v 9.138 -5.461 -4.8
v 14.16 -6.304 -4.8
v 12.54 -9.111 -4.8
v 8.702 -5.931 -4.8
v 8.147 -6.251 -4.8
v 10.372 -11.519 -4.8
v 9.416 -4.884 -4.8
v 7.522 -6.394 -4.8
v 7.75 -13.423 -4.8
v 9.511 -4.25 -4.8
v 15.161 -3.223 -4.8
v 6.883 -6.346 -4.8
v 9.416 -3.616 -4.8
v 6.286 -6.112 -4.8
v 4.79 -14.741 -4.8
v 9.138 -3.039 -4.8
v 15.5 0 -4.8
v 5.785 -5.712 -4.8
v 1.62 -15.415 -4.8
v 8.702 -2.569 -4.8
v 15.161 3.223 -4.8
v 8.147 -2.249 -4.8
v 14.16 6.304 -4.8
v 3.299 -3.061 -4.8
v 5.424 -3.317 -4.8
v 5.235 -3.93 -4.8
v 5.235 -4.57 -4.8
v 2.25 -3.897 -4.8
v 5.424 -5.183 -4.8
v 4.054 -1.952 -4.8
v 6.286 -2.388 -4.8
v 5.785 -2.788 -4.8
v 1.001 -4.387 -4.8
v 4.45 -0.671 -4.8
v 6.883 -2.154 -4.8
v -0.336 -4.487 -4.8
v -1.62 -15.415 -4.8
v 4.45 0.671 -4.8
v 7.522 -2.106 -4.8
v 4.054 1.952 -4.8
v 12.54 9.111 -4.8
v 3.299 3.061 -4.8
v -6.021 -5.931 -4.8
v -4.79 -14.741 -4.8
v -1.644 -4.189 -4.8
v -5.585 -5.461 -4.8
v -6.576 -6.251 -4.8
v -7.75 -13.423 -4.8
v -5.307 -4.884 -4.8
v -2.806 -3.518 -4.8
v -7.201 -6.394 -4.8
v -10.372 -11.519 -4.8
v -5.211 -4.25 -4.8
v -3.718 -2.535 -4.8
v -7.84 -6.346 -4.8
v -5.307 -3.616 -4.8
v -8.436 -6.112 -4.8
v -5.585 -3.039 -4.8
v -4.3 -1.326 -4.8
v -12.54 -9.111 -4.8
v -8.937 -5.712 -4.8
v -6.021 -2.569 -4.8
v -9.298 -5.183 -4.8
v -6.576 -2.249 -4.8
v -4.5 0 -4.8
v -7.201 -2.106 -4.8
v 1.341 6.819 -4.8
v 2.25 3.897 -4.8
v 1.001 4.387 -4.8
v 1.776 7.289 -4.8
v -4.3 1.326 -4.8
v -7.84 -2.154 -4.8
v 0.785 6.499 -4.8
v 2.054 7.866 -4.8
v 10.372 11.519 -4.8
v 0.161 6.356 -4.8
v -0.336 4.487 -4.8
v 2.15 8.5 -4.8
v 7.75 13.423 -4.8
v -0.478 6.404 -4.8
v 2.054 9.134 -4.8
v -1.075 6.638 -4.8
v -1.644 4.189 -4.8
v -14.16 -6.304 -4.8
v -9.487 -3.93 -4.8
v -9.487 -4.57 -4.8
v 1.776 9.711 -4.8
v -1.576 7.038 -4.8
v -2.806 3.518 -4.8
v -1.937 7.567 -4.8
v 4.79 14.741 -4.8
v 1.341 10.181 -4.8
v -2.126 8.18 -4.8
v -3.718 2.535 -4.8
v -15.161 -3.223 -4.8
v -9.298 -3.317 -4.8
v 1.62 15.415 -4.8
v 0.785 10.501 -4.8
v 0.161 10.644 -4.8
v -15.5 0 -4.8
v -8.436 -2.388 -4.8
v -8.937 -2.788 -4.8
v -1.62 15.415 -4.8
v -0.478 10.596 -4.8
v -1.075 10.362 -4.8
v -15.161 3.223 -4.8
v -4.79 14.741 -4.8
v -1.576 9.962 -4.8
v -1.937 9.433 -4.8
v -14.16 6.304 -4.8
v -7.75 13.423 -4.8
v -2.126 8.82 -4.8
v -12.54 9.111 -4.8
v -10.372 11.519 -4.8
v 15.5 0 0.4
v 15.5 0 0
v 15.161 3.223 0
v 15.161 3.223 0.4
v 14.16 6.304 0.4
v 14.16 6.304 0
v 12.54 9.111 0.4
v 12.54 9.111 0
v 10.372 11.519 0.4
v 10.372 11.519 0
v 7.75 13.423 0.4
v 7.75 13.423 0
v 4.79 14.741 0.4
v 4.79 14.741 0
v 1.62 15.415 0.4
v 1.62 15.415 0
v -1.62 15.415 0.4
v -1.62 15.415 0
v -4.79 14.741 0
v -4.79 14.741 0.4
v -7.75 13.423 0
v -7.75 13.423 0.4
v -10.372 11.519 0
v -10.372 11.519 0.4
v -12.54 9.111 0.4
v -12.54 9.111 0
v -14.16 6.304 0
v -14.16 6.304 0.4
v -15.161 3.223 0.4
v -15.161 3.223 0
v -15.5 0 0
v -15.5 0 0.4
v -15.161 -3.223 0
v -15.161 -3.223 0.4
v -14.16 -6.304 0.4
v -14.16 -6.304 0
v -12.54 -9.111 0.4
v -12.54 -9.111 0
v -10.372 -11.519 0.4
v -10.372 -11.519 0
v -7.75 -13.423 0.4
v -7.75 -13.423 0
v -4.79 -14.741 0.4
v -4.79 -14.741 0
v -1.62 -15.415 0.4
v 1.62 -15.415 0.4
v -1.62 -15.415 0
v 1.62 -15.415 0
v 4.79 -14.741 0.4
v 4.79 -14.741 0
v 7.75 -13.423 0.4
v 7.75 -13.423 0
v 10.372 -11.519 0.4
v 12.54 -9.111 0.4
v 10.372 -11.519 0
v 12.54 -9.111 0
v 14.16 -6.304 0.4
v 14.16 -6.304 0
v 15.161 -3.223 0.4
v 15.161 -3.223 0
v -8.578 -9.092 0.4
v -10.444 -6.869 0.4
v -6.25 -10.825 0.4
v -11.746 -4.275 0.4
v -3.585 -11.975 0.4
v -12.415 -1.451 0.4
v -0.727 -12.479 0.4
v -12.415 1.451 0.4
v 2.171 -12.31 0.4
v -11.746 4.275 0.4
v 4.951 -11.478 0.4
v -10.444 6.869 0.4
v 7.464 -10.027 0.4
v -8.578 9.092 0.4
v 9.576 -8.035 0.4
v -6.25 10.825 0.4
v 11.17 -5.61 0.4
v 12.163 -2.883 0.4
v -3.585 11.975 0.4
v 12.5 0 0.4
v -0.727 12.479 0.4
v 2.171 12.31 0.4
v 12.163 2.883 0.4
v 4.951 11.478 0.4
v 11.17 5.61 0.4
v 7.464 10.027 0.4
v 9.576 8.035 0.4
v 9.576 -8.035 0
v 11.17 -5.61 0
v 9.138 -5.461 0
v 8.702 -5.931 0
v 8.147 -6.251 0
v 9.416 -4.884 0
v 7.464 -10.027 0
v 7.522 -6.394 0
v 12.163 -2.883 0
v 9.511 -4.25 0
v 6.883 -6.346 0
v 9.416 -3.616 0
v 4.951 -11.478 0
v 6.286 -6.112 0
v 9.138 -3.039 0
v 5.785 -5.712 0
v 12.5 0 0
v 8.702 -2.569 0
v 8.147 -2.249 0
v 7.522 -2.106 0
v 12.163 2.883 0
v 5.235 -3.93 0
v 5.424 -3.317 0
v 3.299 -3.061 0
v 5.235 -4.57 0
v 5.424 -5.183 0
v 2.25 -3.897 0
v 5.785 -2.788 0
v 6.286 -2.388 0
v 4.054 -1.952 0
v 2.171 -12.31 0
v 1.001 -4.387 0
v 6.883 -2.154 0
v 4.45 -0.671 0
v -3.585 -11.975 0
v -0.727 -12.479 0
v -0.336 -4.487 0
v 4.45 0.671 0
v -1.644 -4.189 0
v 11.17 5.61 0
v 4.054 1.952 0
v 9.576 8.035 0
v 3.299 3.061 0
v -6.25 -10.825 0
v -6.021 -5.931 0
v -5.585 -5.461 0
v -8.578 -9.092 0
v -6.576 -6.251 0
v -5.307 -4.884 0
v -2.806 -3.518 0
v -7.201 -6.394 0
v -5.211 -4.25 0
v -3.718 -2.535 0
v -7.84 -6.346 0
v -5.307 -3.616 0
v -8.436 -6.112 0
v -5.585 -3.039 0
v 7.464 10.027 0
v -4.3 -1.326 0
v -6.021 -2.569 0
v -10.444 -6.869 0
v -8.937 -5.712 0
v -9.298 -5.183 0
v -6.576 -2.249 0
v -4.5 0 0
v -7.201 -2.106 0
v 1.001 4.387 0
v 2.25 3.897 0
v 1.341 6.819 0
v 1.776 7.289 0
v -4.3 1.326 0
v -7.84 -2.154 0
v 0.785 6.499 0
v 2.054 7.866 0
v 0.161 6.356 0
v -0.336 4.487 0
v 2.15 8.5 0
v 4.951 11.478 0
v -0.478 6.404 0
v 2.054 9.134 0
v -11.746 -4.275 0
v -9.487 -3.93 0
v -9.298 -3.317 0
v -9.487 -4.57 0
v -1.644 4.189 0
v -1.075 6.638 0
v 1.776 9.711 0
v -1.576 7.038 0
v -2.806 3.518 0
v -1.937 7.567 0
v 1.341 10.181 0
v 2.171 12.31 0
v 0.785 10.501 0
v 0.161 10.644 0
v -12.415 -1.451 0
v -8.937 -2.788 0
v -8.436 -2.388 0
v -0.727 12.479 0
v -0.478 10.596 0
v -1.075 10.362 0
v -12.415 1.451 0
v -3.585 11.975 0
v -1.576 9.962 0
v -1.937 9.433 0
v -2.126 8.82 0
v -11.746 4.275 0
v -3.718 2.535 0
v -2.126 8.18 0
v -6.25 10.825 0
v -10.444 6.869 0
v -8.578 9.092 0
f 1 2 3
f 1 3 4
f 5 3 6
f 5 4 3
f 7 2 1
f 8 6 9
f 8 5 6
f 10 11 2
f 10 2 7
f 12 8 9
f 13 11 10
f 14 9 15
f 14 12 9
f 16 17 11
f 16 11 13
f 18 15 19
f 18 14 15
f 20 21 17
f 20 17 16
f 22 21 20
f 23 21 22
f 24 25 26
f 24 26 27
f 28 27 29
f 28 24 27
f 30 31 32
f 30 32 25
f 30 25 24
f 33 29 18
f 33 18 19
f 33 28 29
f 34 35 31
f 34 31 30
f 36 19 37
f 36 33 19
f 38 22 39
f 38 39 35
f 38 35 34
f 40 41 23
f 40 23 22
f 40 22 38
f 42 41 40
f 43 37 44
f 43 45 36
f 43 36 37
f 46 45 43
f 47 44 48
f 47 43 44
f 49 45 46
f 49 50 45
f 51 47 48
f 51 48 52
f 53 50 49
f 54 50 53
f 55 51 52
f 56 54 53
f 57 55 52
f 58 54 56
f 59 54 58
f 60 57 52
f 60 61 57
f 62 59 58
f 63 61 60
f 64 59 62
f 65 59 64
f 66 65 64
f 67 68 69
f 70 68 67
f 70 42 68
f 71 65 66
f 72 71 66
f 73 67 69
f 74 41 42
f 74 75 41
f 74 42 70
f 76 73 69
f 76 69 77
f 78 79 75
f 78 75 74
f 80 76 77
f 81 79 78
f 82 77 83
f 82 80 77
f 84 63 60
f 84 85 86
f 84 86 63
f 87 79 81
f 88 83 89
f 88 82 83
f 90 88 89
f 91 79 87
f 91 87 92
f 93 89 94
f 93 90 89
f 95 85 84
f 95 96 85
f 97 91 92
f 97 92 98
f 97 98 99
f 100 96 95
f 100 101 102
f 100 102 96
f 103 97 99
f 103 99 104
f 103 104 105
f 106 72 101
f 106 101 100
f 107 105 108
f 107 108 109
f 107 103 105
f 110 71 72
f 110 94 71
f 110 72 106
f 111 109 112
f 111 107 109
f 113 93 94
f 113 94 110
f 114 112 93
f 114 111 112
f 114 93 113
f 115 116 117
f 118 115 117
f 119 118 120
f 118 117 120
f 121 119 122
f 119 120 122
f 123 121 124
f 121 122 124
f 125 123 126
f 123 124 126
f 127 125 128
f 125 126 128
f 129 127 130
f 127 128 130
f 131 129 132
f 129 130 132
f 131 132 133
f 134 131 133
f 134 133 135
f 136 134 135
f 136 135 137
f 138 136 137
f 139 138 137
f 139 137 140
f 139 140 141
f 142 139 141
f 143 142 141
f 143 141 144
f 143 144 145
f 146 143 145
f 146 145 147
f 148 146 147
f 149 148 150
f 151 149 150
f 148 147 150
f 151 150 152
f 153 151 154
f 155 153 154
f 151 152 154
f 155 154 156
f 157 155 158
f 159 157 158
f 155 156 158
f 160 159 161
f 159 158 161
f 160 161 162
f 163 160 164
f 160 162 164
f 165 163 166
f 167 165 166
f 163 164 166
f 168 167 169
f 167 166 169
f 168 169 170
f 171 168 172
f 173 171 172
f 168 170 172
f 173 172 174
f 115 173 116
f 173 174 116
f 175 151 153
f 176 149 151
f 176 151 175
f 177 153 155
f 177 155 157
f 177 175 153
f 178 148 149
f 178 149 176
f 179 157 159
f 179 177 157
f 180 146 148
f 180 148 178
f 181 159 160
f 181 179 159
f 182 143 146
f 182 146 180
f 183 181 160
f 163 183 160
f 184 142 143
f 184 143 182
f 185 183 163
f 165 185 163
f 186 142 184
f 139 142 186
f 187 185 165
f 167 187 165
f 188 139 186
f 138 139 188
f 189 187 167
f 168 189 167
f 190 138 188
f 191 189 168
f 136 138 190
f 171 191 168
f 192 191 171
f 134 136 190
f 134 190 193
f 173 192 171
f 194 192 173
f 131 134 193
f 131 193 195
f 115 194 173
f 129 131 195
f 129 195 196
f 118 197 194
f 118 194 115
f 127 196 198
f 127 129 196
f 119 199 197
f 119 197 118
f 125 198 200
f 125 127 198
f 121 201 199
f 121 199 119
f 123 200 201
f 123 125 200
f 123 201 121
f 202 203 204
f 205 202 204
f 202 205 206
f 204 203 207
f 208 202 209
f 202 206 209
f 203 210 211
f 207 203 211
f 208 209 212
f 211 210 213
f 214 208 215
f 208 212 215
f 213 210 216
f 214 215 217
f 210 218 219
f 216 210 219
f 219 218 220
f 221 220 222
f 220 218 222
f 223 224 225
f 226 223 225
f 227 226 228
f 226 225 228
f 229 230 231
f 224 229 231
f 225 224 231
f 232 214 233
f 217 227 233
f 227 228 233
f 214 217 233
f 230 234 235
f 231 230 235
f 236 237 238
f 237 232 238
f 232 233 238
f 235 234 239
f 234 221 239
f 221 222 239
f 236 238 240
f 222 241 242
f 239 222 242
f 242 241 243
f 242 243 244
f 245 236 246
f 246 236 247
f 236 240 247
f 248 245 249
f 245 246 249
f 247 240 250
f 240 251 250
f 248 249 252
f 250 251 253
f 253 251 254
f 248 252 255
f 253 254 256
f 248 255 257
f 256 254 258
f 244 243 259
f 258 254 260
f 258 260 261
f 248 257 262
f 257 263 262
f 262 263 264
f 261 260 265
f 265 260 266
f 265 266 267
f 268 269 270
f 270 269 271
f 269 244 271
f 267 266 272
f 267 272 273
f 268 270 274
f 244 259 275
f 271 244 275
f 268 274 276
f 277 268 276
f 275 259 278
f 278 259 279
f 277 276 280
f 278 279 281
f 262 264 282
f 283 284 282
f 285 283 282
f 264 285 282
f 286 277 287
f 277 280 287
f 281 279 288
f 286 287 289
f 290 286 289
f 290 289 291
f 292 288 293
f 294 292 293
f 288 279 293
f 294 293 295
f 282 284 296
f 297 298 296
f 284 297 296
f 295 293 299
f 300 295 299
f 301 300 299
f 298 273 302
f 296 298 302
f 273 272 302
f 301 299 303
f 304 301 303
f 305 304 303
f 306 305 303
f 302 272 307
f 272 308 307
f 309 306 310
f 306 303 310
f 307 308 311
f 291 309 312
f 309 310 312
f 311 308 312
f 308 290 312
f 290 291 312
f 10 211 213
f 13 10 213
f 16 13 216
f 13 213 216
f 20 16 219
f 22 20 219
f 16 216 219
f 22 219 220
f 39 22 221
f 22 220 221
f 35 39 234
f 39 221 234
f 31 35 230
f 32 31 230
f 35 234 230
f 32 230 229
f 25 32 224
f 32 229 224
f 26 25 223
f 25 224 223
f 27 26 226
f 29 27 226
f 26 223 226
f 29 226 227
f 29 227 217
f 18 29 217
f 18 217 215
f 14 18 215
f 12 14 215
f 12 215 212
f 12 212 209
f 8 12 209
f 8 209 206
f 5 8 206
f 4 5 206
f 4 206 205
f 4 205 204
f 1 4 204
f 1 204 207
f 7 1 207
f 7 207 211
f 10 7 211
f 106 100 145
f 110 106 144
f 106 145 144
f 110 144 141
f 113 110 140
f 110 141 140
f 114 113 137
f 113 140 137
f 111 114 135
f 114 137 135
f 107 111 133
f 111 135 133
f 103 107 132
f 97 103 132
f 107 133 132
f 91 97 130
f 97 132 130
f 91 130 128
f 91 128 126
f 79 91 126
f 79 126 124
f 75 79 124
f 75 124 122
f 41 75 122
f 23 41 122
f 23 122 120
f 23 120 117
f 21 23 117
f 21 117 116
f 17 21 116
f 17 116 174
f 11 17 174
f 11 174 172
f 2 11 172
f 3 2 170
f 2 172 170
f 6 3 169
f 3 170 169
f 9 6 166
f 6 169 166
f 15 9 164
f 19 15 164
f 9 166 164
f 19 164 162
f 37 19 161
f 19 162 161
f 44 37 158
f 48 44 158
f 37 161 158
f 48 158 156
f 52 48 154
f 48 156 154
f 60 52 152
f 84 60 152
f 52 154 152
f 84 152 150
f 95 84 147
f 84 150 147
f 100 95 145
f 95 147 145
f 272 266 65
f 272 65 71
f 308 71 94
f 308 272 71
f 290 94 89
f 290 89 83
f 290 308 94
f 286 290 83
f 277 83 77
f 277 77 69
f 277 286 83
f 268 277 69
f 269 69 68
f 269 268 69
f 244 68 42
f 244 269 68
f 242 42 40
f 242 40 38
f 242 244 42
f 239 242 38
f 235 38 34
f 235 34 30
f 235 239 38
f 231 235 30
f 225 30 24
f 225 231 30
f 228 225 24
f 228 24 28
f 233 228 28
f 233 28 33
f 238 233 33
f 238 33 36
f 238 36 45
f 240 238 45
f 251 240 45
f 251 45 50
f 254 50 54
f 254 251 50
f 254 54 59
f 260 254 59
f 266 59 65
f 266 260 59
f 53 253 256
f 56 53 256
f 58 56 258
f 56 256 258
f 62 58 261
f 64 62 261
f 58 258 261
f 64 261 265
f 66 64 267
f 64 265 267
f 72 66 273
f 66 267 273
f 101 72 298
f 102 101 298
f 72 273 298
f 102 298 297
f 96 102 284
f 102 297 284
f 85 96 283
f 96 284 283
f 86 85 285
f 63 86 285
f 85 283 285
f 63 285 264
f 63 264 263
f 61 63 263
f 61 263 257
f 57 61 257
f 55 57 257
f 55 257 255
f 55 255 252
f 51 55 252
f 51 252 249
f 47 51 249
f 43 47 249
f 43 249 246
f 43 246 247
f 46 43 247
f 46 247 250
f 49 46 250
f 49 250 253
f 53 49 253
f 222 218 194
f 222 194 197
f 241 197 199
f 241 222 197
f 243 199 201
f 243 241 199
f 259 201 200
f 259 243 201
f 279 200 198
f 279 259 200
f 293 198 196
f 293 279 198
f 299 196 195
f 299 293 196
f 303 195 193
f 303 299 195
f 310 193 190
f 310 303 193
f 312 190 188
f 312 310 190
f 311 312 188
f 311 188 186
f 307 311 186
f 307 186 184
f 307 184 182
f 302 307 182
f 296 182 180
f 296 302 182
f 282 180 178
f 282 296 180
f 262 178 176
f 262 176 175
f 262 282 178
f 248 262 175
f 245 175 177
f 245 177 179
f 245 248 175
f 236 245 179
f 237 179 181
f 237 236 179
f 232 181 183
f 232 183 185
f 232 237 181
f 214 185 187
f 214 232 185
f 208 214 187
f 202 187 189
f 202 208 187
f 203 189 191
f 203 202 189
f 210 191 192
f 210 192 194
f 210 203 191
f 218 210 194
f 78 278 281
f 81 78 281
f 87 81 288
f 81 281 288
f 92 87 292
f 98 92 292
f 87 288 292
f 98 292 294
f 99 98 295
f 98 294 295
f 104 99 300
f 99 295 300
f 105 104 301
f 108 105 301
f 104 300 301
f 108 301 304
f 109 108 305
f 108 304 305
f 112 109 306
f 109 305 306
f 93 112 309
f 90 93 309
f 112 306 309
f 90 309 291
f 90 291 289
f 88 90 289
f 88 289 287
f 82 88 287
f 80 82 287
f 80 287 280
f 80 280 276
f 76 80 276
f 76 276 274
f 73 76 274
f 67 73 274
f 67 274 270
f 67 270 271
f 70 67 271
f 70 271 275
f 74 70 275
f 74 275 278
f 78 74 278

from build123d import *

# Parameters (mm, degrees)
SKETCH1_R            = 15.5
SKETCH1_R_2          = 12.5
BOSS_EXTRUDE1_DEPTH  = 0.4
SKETCH2_R            = 15.5
SKETCH2_R_2          = 4.5
BOSS_EXTRUDE2_DEPTH  = 4.8
M4_CLEARANCE_HOLE1_D = 4.3


with BuildPart() as part:
    # Sketch1 → Boss-Extrude1 (new body)
    with BuildSketch(Plane.XY):
        Circle(SKETCH1_R)
        Circle(SKETCH1_R_2, mode=Mode.SUBTRACT)
    extrude(amount=BOSS_EXTRUDE1_DEPTH)

    # Sketch2 → Boss-Extrude2 (add)
    with BuildSketch(Plane(origin=(0, 0, 0), x_dir=(-1, 0, 0), z_dir=(0, 0, -1))):
        Circle(SKETCH2_R)
        Circle(SKETCH2_R_2, mode=Mode.SUBTRACT)
    extrude(amount=BOSS_EXTRUDE2_DEPTH)

    # M4 Clearance Hole1 (through all)
    with Locations(Plane(origin=(0, 0, -4.8), x_dir=(-1, 0, 0), z_dir=(0, 0, -1))):
        with Locations((0, 8.5), (7.361215932, -4.25), (-7.361215932, -4.25)):
            Hole(M4_CLEARANCE_HOLE1_D / 2)


solid = part.part
